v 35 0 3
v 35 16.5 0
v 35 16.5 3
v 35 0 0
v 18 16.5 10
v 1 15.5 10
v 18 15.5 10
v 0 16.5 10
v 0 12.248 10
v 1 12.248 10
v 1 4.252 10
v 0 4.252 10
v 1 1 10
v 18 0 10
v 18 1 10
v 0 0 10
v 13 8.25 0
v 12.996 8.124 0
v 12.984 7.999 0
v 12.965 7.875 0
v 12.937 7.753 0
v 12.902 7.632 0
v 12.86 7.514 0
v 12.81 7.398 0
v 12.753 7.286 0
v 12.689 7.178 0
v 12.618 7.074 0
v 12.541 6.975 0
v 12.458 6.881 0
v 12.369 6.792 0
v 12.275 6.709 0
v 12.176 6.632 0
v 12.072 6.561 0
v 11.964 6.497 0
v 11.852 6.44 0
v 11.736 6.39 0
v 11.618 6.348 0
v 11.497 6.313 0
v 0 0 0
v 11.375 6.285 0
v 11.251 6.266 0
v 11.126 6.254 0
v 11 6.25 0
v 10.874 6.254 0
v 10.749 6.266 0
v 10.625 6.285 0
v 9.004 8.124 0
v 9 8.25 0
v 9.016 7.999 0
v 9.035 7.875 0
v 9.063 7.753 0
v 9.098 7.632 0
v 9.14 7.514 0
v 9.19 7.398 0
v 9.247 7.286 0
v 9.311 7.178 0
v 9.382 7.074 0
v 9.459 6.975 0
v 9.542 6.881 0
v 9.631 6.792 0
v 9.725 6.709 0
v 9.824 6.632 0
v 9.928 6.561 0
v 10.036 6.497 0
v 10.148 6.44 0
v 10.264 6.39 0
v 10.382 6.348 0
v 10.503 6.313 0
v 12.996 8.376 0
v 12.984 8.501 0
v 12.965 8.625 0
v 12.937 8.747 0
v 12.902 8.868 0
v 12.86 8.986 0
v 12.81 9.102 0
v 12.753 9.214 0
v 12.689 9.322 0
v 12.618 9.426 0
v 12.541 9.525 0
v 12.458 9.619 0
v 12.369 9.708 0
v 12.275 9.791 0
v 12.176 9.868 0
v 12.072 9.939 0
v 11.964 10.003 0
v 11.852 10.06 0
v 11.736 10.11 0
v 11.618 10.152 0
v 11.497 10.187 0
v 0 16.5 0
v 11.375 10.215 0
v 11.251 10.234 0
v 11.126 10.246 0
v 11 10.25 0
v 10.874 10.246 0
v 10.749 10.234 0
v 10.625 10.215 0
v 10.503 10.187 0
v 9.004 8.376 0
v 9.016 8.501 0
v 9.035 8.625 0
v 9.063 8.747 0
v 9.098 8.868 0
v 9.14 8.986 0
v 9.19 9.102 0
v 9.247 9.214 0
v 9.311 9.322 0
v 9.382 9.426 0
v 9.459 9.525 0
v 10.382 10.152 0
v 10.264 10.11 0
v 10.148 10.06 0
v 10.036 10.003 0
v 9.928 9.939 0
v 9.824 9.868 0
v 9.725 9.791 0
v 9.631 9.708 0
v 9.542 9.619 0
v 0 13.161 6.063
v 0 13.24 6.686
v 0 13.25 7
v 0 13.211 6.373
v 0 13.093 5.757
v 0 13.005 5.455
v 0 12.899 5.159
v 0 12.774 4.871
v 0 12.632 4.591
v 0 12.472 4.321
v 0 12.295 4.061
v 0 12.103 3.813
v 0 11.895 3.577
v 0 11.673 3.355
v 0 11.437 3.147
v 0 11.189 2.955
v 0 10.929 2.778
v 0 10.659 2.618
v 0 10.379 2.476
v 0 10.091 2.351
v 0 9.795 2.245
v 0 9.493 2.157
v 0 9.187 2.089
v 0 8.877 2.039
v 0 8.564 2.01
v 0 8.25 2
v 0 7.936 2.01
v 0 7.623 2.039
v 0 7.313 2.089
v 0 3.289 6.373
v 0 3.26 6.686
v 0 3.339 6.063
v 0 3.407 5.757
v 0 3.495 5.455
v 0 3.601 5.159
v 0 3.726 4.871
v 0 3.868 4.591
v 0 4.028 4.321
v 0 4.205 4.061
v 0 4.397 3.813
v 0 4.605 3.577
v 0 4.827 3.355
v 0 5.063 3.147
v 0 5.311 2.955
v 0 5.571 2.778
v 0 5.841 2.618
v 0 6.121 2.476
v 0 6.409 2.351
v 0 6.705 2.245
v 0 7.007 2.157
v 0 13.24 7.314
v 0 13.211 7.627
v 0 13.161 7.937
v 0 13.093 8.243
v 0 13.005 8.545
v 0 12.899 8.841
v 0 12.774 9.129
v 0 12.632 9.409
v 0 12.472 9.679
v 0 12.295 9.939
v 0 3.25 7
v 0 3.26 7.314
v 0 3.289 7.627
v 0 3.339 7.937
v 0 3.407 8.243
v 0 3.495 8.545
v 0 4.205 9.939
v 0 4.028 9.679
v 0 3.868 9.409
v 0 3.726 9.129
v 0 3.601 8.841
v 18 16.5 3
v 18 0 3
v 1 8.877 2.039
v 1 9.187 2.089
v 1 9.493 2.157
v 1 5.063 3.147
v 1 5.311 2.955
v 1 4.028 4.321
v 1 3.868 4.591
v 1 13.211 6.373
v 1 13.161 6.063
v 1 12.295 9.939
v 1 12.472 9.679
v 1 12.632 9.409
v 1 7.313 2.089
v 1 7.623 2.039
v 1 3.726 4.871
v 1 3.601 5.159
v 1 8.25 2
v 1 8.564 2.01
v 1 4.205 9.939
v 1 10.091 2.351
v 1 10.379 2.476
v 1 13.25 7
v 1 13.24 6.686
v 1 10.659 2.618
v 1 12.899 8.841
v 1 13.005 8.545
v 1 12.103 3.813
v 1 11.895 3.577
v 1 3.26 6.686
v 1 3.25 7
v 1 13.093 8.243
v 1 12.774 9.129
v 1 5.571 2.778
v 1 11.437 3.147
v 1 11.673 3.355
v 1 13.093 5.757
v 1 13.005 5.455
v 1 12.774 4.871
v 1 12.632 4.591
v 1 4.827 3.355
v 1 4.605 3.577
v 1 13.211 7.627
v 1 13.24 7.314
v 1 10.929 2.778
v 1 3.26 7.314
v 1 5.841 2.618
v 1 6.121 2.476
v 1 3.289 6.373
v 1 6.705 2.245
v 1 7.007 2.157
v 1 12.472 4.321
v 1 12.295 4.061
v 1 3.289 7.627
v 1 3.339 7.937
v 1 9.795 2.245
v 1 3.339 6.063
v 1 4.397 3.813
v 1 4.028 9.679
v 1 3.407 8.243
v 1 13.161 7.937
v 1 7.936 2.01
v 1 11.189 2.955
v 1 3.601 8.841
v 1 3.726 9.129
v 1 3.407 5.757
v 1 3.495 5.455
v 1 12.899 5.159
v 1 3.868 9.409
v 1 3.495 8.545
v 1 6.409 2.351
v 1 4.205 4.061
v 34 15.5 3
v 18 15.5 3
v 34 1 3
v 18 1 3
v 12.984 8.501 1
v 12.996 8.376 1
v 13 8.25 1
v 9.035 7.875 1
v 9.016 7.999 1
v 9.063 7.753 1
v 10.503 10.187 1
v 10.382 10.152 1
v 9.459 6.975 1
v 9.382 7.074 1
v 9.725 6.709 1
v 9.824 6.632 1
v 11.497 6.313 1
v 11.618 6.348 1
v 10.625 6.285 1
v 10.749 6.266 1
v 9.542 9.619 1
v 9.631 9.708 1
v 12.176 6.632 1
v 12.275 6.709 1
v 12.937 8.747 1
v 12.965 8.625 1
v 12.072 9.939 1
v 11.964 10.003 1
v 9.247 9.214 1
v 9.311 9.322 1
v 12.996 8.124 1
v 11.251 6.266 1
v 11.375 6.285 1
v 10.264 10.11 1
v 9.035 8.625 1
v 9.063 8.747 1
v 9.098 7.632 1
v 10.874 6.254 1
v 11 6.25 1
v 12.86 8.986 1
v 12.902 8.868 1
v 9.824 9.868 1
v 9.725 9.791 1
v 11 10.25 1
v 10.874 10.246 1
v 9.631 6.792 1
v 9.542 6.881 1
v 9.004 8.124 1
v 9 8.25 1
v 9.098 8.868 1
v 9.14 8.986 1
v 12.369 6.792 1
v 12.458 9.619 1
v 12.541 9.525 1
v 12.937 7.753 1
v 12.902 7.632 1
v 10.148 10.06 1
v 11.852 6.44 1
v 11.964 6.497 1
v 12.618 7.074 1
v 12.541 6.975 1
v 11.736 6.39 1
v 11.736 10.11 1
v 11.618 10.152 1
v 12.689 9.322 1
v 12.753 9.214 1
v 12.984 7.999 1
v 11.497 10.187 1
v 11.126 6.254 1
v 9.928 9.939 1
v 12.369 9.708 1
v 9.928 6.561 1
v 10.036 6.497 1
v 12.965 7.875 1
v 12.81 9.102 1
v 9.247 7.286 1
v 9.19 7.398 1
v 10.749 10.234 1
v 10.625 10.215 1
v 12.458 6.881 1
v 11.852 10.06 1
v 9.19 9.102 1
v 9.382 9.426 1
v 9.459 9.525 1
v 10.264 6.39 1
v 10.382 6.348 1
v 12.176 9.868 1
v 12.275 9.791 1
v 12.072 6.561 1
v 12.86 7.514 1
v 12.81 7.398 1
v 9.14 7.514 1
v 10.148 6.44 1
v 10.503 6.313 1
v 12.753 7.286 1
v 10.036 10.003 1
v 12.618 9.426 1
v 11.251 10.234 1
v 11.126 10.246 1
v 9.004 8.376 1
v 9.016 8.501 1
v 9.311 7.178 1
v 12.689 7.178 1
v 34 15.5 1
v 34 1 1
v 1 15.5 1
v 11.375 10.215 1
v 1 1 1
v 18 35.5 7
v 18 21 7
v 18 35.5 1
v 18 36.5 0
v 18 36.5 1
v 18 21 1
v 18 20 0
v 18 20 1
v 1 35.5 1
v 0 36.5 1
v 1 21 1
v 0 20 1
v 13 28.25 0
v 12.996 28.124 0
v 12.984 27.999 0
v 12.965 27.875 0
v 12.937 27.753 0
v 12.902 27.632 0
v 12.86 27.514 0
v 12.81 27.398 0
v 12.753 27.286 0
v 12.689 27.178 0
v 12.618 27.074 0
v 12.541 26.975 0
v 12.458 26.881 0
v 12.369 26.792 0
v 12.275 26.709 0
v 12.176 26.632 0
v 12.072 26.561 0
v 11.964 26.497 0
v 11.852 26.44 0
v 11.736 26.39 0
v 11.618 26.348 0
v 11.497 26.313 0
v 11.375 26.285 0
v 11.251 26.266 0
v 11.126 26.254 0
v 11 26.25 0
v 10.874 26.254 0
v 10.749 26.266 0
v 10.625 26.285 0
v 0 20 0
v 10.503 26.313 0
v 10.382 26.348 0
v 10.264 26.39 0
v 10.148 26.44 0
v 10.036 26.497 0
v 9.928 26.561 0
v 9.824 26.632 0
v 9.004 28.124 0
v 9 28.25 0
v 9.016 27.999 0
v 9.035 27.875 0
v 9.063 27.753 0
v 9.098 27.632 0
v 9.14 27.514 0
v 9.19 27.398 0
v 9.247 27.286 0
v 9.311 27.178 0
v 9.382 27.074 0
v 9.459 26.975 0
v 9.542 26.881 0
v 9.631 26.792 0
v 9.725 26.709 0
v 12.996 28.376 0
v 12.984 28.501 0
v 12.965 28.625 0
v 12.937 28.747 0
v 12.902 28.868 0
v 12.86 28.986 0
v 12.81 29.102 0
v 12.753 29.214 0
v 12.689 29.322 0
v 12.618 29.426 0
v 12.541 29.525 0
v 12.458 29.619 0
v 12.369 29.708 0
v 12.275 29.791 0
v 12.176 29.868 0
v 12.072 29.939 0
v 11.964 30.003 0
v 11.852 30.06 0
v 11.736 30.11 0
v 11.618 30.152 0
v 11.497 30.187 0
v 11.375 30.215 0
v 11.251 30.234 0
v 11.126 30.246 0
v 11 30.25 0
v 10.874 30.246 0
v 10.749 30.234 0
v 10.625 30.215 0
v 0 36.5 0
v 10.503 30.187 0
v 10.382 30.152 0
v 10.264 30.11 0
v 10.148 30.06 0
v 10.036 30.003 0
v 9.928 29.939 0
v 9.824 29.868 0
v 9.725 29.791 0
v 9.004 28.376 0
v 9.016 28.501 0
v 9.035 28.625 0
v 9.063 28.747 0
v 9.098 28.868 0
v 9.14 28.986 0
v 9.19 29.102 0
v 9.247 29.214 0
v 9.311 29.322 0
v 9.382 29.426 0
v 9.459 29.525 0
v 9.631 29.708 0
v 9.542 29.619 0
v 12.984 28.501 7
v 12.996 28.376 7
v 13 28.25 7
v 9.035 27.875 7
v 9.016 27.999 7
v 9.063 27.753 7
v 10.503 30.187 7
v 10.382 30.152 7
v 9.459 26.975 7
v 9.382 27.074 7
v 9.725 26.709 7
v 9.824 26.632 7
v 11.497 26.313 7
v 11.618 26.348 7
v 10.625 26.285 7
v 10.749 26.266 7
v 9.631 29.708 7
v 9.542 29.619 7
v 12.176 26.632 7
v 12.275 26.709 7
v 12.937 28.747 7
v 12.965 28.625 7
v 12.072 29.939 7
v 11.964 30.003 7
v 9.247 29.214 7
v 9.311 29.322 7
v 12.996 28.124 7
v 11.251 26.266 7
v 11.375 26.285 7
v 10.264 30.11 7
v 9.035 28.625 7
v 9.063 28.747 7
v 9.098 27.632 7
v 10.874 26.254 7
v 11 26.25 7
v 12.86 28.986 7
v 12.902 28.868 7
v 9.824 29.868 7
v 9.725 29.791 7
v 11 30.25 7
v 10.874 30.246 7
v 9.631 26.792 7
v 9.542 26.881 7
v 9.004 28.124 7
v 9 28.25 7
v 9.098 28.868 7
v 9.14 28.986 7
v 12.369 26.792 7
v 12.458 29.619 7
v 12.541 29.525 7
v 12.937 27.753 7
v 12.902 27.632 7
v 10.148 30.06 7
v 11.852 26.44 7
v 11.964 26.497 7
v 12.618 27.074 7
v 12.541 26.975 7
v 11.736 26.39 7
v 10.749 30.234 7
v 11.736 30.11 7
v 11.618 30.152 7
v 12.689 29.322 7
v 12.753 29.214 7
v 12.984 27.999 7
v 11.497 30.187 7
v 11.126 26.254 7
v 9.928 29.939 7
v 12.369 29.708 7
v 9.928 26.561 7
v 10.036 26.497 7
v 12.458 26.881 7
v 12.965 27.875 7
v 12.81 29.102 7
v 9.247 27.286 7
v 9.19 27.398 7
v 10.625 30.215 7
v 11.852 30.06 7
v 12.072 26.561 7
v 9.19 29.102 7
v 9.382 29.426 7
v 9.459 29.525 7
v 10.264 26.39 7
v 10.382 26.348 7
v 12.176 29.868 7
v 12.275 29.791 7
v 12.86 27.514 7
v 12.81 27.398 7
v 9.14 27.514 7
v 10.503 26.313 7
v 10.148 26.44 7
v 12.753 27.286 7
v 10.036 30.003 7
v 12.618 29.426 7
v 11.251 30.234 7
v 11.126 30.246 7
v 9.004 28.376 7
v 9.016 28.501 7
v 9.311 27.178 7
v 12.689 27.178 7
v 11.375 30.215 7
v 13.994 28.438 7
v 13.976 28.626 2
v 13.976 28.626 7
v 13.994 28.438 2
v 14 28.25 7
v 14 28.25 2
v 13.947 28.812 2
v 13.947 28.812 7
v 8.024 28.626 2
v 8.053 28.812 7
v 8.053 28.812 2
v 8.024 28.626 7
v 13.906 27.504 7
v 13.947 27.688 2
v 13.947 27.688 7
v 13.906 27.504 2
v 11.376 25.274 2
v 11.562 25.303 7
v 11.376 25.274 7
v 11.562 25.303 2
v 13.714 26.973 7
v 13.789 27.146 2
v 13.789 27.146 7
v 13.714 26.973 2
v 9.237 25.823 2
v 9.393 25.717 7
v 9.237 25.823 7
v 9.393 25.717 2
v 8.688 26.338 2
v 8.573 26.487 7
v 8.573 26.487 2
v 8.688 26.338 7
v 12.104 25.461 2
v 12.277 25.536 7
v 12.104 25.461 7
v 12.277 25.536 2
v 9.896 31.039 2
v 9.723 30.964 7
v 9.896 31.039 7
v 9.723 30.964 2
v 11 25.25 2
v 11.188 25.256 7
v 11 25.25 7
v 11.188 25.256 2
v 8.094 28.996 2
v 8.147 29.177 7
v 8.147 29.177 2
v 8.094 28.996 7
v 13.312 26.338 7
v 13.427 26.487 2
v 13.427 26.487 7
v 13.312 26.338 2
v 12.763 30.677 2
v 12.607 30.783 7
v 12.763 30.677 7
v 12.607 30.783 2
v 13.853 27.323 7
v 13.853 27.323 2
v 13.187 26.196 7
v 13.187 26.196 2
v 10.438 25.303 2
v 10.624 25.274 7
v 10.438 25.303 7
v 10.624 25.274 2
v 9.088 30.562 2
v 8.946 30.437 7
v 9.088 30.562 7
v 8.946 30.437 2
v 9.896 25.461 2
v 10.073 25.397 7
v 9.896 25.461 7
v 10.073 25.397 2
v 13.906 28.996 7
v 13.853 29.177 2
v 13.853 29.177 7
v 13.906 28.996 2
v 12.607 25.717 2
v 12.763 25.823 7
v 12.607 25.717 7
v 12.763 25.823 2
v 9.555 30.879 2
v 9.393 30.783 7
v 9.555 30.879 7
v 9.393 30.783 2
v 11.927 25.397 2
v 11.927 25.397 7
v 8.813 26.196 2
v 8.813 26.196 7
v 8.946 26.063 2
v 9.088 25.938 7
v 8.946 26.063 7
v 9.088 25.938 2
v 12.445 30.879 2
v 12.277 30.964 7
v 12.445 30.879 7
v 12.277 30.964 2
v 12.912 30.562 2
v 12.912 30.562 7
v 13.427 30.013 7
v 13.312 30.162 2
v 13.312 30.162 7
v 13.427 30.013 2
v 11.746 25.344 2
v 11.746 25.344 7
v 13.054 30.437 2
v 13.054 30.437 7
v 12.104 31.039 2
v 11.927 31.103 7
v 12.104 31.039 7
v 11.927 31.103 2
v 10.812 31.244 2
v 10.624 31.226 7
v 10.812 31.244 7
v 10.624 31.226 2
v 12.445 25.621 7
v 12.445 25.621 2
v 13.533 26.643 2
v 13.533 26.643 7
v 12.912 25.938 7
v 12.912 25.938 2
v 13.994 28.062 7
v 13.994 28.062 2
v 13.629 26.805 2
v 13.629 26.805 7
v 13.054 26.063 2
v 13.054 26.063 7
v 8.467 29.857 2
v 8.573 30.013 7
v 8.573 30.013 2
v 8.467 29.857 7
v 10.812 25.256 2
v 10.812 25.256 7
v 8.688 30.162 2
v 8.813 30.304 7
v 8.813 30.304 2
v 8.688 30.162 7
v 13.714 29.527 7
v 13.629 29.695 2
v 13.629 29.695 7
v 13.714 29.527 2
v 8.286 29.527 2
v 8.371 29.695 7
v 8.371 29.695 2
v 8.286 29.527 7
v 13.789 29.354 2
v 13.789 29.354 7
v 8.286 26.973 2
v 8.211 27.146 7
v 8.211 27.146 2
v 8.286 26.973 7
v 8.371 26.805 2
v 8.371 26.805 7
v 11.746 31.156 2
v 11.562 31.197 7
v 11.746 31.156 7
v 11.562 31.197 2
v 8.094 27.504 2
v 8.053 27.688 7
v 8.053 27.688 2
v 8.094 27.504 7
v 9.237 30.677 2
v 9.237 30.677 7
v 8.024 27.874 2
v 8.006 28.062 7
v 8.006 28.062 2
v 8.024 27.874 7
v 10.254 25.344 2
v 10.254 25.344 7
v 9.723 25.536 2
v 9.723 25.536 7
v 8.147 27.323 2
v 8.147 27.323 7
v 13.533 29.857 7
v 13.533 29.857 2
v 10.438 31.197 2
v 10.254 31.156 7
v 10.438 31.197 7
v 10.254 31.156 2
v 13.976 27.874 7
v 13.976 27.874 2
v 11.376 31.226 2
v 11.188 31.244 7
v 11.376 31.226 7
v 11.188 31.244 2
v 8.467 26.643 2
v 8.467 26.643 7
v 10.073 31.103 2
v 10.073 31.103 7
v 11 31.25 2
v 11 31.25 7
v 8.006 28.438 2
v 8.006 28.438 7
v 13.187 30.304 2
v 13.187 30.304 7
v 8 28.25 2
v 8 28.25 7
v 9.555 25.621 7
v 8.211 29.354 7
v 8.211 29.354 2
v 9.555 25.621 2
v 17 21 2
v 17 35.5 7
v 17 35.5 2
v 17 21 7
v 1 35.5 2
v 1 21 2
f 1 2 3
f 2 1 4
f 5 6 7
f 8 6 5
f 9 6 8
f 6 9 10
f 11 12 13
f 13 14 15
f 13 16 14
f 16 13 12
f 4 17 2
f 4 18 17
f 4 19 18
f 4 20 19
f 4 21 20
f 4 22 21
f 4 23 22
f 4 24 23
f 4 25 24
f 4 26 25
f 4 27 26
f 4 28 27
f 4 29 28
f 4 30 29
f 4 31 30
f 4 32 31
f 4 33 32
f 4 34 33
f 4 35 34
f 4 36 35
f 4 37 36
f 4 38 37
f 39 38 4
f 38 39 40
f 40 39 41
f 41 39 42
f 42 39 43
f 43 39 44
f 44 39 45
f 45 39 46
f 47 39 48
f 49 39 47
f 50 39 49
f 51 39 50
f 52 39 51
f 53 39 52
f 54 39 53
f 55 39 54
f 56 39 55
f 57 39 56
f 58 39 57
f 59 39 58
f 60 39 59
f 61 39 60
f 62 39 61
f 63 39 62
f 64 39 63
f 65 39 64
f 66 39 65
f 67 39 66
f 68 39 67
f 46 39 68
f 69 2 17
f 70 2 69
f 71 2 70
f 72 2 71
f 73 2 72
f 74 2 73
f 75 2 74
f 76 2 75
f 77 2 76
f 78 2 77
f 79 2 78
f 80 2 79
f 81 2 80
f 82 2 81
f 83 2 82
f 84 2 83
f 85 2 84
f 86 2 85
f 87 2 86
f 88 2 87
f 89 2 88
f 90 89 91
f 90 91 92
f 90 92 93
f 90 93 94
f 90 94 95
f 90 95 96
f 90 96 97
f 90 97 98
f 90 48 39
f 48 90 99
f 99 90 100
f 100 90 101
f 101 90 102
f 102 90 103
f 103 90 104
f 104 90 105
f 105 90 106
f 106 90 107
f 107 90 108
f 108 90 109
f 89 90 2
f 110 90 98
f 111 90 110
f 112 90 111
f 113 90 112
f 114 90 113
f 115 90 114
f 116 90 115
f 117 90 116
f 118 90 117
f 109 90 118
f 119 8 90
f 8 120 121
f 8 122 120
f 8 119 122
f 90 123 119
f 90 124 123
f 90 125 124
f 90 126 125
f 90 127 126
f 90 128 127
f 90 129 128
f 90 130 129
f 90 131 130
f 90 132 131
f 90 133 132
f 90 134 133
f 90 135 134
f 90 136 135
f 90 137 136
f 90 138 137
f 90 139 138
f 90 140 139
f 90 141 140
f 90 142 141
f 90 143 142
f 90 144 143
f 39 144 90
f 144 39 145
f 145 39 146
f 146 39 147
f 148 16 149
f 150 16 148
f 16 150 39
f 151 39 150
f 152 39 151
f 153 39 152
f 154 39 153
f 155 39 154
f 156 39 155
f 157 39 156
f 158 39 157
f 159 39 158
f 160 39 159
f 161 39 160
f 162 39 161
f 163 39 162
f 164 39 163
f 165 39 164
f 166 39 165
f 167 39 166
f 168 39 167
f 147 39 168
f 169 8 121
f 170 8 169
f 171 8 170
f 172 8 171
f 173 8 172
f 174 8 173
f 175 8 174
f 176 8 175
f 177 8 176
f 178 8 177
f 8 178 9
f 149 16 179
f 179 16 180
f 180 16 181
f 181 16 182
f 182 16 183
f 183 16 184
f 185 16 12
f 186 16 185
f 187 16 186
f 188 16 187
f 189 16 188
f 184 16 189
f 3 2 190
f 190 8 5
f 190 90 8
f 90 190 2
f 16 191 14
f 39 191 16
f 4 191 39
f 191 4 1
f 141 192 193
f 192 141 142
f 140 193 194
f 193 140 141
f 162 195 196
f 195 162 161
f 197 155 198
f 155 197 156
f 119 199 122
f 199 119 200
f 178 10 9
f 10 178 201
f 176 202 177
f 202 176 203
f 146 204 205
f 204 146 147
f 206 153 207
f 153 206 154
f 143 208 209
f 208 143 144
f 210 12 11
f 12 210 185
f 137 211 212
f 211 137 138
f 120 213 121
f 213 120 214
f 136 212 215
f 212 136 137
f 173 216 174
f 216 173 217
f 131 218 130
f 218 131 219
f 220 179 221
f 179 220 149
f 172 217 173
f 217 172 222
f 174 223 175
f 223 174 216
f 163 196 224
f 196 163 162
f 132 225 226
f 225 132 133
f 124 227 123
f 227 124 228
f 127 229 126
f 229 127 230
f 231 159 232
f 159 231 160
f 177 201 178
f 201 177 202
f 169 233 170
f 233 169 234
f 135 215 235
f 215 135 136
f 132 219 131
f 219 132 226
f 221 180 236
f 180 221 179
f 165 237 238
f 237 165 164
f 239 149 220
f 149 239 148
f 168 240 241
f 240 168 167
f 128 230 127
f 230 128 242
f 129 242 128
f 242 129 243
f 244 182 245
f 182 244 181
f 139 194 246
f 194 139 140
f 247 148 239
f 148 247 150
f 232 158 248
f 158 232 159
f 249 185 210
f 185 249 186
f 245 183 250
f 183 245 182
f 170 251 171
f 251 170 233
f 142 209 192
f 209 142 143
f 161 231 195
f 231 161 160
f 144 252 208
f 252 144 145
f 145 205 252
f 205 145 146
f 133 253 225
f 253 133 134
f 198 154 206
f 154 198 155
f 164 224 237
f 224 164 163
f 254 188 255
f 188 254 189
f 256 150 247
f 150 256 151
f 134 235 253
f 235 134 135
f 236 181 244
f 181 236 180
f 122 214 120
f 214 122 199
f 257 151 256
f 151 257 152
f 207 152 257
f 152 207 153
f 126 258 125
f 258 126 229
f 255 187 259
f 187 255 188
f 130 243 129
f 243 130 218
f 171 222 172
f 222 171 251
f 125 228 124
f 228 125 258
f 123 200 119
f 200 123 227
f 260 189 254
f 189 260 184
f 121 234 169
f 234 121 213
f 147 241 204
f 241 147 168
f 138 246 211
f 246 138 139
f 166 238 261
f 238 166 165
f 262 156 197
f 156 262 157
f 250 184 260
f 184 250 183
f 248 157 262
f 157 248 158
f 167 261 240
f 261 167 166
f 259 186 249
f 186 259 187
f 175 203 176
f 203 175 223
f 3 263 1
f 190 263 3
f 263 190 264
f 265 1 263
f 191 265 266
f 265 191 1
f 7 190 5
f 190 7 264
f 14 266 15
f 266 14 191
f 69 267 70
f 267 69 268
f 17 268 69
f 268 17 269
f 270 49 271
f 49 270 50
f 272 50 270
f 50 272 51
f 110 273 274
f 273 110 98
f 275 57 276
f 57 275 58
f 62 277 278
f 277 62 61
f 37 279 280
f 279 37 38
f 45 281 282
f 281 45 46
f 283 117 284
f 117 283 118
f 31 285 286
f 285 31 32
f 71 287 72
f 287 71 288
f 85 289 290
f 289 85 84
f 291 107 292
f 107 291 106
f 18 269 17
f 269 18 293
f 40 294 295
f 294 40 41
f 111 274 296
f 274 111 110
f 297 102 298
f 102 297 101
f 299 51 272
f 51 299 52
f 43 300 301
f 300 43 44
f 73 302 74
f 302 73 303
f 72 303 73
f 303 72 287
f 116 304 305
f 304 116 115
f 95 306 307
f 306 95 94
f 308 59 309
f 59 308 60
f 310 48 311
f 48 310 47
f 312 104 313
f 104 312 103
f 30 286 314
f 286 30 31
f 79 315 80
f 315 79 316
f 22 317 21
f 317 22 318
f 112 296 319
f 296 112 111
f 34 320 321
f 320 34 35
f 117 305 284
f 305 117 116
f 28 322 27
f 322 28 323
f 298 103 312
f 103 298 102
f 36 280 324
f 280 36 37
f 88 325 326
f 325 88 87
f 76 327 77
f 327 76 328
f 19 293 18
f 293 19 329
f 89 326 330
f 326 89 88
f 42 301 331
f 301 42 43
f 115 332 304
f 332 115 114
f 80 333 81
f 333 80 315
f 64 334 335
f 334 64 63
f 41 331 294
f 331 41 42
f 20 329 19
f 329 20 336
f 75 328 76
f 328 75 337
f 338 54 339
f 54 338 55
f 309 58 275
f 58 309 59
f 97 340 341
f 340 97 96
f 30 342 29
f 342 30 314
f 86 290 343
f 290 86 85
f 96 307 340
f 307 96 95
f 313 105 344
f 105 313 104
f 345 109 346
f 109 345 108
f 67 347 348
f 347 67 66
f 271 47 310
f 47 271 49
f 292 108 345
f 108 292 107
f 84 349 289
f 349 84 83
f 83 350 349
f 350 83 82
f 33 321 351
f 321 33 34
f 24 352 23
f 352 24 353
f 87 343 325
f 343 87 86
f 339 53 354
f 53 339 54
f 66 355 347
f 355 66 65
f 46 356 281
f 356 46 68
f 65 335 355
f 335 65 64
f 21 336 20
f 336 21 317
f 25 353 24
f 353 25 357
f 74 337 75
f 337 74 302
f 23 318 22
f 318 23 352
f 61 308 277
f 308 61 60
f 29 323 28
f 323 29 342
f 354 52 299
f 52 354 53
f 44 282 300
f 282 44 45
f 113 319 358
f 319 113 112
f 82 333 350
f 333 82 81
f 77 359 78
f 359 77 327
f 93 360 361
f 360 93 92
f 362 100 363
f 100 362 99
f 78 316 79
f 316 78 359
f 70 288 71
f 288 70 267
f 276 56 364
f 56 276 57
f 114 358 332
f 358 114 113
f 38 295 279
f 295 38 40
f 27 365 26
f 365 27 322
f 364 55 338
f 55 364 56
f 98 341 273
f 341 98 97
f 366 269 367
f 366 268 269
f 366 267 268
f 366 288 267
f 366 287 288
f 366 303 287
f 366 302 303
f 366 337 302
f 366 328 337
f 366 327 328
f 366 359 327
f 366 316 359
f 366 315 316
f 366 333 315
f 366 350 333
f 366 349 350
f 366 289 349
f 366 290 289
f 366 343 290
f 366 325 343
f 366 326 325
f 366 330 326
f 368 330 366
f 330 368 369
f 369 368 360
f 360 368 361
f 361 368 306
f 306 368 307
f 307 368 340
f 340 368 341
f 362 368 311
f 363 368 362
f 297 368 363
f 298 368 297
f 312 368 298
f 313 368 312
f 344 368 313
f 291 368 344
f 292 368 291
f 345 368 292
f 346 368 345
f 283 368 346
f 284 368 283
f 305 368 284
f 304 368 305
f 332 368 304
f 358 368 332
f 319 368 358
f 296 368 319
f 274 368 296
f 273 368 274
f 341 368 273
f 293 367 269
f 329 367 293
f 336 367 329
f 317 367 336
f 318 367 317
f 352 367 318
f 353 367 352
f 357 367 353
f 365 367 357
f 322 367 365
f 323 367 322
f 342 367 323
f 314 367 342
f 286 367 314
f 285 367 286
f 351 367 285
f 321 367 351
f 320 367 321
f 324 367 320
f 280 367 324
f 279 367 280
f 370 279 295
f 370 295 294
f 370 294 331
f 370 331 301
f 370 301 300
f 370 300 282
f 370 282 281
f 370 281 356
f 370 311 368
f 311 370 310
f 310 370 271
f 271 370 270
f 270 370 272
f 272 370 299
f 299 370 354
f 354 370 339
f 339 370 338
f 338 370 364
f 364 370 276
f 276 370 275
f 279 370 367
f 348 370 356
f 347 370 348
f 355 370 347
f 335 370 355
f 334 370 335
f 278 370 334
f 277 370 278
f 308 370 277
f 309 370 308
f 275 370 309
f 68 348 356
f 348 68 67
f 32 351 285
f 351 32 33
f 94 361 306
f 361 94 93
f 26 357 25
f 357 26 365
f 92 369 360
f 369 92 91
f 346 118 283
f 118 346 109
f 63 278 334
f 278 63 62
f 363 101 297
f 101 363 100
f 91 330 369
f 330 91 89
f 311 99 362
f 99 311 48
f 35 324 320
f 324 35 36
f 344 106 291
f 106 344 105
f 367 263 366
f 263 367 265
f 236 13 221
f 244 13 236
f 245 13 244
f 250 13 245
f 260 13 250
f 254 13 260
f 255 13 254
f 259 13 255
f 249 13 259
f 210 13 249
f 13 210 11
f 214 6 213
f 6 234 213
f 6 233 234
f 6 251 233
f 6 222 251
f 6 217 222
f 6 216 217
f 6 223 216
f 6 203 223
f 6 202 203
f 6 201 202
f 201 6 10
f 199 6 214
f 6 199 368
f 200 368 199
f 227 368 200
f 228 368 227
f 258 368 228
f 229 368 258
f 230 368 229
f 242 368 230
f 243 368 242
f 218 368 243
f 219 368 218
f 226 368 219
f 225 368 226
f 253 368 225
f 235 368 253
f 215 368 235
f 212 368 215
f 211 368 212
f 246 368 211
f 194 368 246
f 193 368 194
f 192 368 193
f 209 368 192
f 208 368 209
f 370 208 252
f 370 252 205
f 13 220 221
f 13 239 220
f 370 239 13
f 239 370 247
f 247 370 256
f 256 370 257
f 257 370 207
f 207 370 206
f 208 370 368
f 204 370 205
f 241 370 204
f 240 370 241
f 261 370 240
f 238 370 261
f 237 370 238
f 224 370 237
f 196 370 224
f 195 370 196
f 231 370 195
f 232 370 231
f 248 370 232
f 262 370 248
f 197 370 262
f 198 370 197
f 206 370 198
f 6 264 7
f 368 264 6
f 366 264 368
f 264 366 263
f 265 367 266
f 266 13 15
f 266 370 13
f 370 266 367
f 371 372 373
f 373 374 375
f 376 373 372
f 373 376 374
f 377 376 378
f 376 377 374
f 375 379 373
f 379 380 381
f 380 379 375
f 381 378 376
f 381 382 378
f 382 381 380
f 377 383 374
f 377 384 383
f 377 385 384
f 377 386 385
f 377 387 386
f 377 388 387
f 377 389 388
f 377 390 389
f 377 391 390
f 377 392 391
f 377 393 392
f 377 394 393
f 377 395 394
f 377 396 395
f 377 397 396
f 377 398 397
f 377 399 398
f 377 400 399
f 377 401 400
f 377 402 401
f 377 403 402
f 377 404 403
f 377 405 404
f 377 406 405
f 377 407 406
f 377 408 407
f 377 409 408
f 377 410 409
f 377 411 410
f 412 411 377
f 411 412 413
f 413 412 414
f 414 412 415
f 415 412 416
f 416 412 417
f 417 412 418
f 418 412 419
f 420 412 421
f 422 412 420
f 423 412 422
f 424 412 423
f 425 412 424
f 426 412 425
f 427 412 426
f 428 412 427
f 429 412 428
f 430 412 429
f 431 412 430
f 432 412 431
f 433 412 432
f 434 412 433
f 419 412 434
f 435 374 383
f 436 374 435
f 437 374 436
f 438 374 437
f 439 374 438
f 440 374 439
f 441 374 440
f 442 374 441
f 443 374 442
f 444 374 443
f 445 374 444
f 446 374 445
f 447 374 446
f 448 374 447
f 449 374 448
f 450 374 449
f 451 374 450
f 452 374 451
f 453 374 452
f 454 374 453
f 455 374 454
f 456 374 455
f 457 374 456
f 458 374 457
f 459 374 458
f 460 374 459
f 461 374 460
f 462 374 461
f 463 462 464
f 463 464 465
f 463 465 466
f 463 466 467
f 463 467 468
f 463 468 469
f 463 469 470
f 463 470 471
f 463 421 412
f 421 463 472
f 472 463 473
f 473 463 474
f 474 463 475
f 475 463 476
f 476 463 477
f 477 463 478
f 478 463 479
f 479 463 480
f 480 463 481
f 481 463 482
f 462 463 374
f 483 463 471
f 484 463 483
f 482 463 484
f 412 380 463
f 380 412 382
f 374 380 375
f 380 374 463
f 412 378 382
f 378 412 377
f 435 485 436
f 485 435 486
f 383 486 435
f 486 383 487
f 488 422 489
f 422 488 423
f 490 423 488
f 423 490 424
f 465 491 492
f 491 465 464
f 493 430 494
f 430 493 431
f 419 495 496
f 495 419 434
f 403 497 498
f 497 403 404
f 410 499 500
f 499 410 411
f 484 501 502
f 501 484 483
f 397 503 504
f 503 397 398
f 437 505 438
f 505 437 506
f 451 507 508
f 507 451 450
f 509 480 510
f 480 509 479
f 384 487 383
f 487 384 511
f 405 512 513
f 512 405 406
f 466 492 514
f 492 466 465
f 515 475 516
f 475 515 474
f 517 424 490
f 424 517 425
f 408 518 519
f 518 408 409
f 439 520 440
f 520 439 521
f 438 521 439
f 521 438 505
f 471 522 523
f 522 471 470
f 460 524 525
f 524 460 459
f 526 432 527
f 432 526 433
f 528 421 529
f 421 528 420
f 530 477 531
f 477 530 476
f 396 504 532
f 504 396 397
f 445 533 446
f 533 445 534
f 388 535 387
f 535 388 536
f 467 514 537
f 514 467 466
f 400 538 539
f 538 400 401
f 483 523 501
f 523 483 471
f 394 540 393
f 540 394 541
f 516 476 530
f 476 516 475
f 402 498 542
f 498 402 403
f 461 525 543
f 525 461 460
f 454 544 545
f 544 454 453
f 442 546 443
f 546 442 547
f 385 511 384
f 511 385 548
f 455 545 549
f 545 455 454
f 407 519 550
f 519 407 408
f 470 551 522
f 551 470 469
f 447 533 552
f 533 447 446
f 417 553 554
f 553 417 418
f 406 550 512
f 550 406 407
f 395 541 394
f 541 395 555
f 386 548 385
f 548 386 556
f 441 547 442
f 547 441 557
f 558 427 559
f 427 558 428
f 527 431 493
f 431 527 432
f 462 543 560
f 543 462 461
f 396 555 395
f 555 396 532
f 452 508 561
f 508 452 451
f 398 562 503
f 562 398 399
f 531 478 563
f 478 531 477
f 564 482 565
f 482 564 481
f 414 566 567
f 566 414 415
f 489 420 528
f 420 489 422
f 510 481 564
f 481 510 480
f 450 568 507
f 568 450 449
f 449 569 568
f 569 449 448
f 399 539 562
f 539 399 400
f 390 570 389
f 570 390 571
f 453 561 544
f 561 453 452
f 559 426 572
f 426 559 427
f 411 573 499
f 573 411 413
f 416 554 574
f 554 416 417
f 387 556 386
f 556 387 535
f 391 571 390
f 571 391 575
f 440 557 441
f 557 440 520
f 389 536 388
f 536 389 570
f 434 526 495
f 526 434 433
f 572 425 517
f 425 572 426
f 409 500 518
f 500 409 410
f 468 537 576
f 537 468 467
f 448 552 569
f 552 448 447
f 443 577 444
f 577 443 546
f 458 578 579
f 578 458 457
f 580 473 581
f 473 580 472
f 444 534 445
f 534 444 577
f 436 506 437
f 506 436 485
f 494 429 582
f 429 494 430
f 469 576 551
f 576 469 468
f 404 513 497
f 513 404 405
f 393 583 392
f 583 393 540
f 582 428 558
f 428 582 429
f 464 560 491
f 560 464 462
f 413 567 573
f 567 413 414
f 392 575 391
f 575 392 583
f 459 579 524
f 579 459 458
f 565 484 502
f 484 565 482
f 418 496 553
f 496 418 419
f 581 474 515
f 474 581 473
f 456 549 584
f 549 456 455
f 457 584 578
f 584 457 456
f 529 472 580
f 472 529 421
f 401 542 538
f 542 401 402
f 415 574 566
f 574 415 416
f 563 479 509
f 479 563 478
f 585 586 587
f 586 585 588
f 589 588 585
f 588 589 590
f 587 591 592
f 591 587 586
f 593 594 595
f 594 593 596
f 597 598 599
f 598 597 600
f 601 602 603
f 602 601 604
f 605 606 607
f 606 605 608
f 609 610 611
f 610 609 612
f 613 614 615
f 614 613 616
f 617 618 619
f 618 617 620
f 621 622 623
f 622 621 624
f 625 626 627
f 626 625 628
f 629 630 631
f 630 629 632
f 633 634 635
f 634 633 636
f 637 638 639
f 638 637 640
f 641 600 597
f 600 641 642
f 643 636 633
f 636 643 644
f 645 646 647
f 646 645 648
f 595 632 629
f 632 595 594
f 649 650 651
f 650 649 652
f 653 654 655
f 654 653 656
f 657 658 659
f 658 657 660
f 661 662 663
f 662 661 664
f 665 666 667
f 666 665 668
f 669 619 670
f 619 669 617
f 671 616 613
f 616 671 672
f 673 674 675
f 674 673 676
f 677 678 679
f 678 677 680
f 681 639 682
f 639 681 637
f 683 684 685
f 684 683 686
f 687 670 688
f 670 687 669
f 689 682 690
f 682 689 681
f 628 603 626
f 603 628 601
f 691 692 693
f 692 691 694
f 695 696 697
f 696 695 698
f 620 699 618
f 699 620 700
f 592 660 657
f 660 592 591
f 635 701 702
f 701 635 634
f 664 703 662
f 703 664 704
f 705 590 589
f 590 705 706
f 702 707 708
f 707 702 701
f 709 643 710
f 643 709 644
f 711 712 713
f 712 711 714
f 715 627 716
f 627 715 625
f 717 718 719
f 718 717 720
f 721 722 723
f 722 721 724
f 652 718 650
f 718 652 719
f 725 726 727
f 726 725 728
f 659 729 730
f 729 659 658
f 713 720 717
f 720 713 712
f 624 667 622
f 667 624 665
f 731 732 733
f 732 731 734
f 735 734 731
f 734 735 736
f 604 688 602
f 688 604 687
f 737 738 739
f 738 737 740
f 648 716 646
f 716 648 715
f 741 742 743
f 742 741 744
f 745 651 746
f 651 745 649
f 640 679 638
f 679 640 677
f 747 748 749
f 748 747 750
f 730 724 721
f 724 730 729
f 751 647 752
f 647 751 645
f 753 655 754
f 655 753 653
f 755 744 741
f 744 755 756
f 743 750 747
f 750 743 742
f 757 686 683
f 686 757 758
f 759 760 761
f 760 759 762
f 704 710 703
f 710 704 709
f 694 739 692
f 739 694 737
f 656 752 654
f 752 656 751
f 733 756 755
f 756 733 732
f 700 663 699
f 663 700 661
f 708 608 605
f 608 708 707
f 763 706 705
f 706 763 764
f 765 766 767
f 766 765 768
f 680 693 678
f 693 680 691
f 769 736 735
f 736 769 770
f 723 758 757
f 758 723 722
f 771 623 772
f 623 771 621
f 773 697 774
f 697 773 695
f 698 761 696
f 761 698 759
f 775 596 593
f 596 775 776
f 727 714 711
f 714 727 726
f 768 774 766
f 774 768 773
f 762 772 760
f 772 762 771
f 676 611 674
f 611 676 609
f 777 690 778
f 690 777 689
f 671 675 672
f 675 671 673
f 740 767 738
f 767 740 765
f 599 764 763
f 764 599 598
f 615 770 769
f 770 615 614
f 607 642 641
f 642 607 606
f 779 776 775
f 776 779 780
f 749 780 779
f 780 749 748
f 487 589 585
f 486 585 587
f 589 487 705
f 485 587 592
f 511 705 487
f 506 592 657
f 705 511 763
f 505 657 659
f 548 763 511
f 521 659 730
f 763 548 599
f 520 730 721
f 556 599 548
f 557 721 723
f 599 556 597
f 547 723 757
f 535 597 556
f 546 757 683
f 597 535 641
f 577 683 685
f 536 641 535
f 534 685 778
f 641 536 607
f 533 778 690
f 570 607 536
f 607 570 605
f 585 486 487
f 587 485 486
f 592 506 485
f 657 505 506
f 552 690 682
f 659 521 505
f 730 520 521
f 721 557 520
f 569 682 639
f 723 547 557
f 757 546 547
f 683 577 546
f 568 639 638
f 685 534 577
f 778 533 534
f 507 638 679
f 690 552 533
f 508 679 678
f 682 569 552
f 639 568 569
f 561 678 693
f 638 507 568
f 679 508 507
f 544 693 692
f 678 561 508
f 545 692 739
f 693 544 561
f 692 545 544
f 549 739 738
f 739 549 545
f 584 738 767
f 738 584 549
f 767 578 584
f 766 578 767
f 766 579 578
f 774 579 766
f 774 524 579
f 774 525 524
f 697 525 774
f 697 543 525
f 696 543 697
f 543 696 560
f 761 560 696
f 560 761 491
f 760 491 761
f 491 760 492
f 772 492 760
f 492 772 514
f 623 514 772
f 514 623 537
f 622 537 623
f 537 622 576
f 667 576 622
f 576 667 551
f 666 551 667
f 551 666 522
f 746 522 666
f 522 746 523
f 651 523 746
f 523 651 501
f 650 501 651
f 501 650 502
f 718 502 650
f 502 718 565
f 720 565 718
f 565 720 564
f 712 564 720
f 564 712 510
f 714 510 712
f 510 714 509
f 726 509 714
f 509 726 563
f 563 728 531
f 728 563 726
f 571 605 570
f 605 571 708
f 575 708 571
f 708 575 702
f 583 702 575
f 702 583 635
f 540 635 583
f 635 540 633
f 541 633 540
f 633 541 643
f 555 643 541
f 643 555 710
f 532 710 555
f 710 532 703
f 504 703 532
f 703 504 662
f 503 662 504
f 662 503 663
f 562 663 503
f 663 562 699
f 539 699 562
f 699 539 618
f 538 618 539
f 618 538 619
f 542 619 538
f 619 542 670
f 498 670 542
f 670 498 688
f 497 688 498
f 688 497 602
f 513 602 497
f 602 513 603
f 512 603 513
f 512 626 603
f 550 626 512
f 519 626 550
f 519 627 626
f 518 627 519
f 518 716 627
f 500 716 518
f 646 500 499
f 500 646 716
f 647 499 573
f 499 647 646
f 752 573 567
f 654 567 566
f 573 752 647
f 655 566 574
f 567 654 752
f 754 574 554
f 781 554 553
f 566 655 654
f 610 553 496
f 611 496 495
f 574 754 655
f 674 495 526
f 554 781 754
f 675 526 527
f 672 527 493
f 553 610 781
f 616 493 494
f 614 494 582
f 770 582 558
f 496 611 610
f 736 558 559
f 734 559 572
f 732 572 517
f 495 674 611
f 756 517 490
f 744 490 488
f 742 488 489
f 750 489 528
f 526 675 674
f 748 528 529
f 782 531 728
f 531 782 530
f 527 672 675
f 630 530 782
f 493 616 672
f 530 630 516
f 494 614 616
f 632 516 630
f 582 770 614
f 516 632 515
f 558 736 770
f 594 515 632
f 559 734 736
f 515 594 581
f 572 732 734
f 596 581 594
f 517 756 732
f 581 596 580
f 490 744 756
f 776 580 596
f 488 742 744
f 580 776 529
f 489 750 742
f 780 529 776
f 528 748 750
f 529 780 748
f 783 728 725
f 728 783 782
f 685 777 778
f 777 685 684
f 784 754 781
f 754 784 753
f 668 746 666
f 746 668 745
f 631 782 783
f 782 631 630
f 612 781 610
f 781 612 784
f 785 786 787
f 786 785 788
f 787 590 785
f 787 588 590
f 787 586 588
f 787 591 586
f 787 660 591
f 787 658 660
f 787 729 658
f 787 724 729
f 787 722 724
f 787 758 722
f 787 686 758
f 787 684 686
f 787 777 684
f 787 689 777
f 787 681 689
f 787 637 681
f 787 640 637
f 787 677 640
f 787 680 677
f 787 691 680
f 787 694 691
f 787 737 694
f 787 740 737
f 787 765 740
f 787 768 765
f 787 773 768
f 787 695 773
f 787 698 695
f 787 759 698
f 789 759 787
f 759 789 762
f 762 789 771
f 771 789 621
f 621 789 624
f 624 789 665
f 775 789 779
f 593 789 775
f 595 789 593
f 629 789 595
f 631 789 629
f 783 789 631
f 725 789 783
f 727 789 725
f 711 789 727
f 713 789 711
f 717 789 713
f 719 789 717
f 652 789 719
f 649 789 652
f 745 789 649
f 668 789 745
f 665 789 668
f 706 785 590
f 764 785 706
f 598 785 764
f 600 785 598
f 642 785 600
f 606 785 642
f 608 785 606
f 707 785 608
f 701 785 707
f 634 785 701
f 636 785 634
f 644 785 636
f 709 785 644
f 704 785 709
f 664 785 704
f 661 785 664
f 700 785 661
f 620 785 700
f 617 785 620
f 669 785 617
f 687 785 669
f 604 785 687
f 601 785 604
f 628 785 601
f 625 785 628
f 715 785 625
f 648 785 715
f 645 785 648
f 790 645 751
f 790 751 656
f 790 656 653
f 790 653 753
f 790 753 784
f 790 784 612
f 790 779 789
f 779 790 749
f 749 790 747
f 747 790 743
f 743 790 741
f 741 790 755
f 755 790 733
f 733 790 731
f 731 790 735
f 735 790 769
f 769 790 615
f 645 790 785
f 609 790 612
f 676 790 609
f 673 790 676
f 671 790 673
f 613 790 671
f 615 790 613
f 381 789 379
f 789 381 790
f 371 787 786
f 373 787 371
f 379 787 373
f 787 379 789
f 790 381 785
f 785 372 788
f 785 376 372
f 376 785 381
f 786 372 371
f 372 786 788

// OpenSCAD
$fn=100;
difference(){
    cube([35,16.5,10]);
    
    
    translate([0,16.5/2,7])
    rotate([0,90,0])
    cylinder(r=5,h=10);
    
    translate([18,0,3])
    cube([25,16.5,7]);
    
    translate([11,16.5/2,0])
     cylinder(r=2,h=1);
    translate([1,1,1])
    cube([33,14.5,10]);
    
}

translate([0,20,0]){
    difference(){
        cube([35-17,16.5,1]);
        translate([11,16.5/2,0])
        cylinder(r=2,h=1);
        
    }
    
        difference(){
        translate([11,16.5/2,0])
        cylinder(r=3,h=7);    
        translate([11,16.5/2,0])
            
        cylinder(r=2,h=10);
        
    }
}


translate([1,21,1]){
    difference(){
        cube([35-18-1,16.5-2,1]);
        translate([10,14.5/2,0])
        cylinder(r=2,h=1);
        
    }
    translate([16,0,-1])
    cube([1,16.5-2,7]);
}
